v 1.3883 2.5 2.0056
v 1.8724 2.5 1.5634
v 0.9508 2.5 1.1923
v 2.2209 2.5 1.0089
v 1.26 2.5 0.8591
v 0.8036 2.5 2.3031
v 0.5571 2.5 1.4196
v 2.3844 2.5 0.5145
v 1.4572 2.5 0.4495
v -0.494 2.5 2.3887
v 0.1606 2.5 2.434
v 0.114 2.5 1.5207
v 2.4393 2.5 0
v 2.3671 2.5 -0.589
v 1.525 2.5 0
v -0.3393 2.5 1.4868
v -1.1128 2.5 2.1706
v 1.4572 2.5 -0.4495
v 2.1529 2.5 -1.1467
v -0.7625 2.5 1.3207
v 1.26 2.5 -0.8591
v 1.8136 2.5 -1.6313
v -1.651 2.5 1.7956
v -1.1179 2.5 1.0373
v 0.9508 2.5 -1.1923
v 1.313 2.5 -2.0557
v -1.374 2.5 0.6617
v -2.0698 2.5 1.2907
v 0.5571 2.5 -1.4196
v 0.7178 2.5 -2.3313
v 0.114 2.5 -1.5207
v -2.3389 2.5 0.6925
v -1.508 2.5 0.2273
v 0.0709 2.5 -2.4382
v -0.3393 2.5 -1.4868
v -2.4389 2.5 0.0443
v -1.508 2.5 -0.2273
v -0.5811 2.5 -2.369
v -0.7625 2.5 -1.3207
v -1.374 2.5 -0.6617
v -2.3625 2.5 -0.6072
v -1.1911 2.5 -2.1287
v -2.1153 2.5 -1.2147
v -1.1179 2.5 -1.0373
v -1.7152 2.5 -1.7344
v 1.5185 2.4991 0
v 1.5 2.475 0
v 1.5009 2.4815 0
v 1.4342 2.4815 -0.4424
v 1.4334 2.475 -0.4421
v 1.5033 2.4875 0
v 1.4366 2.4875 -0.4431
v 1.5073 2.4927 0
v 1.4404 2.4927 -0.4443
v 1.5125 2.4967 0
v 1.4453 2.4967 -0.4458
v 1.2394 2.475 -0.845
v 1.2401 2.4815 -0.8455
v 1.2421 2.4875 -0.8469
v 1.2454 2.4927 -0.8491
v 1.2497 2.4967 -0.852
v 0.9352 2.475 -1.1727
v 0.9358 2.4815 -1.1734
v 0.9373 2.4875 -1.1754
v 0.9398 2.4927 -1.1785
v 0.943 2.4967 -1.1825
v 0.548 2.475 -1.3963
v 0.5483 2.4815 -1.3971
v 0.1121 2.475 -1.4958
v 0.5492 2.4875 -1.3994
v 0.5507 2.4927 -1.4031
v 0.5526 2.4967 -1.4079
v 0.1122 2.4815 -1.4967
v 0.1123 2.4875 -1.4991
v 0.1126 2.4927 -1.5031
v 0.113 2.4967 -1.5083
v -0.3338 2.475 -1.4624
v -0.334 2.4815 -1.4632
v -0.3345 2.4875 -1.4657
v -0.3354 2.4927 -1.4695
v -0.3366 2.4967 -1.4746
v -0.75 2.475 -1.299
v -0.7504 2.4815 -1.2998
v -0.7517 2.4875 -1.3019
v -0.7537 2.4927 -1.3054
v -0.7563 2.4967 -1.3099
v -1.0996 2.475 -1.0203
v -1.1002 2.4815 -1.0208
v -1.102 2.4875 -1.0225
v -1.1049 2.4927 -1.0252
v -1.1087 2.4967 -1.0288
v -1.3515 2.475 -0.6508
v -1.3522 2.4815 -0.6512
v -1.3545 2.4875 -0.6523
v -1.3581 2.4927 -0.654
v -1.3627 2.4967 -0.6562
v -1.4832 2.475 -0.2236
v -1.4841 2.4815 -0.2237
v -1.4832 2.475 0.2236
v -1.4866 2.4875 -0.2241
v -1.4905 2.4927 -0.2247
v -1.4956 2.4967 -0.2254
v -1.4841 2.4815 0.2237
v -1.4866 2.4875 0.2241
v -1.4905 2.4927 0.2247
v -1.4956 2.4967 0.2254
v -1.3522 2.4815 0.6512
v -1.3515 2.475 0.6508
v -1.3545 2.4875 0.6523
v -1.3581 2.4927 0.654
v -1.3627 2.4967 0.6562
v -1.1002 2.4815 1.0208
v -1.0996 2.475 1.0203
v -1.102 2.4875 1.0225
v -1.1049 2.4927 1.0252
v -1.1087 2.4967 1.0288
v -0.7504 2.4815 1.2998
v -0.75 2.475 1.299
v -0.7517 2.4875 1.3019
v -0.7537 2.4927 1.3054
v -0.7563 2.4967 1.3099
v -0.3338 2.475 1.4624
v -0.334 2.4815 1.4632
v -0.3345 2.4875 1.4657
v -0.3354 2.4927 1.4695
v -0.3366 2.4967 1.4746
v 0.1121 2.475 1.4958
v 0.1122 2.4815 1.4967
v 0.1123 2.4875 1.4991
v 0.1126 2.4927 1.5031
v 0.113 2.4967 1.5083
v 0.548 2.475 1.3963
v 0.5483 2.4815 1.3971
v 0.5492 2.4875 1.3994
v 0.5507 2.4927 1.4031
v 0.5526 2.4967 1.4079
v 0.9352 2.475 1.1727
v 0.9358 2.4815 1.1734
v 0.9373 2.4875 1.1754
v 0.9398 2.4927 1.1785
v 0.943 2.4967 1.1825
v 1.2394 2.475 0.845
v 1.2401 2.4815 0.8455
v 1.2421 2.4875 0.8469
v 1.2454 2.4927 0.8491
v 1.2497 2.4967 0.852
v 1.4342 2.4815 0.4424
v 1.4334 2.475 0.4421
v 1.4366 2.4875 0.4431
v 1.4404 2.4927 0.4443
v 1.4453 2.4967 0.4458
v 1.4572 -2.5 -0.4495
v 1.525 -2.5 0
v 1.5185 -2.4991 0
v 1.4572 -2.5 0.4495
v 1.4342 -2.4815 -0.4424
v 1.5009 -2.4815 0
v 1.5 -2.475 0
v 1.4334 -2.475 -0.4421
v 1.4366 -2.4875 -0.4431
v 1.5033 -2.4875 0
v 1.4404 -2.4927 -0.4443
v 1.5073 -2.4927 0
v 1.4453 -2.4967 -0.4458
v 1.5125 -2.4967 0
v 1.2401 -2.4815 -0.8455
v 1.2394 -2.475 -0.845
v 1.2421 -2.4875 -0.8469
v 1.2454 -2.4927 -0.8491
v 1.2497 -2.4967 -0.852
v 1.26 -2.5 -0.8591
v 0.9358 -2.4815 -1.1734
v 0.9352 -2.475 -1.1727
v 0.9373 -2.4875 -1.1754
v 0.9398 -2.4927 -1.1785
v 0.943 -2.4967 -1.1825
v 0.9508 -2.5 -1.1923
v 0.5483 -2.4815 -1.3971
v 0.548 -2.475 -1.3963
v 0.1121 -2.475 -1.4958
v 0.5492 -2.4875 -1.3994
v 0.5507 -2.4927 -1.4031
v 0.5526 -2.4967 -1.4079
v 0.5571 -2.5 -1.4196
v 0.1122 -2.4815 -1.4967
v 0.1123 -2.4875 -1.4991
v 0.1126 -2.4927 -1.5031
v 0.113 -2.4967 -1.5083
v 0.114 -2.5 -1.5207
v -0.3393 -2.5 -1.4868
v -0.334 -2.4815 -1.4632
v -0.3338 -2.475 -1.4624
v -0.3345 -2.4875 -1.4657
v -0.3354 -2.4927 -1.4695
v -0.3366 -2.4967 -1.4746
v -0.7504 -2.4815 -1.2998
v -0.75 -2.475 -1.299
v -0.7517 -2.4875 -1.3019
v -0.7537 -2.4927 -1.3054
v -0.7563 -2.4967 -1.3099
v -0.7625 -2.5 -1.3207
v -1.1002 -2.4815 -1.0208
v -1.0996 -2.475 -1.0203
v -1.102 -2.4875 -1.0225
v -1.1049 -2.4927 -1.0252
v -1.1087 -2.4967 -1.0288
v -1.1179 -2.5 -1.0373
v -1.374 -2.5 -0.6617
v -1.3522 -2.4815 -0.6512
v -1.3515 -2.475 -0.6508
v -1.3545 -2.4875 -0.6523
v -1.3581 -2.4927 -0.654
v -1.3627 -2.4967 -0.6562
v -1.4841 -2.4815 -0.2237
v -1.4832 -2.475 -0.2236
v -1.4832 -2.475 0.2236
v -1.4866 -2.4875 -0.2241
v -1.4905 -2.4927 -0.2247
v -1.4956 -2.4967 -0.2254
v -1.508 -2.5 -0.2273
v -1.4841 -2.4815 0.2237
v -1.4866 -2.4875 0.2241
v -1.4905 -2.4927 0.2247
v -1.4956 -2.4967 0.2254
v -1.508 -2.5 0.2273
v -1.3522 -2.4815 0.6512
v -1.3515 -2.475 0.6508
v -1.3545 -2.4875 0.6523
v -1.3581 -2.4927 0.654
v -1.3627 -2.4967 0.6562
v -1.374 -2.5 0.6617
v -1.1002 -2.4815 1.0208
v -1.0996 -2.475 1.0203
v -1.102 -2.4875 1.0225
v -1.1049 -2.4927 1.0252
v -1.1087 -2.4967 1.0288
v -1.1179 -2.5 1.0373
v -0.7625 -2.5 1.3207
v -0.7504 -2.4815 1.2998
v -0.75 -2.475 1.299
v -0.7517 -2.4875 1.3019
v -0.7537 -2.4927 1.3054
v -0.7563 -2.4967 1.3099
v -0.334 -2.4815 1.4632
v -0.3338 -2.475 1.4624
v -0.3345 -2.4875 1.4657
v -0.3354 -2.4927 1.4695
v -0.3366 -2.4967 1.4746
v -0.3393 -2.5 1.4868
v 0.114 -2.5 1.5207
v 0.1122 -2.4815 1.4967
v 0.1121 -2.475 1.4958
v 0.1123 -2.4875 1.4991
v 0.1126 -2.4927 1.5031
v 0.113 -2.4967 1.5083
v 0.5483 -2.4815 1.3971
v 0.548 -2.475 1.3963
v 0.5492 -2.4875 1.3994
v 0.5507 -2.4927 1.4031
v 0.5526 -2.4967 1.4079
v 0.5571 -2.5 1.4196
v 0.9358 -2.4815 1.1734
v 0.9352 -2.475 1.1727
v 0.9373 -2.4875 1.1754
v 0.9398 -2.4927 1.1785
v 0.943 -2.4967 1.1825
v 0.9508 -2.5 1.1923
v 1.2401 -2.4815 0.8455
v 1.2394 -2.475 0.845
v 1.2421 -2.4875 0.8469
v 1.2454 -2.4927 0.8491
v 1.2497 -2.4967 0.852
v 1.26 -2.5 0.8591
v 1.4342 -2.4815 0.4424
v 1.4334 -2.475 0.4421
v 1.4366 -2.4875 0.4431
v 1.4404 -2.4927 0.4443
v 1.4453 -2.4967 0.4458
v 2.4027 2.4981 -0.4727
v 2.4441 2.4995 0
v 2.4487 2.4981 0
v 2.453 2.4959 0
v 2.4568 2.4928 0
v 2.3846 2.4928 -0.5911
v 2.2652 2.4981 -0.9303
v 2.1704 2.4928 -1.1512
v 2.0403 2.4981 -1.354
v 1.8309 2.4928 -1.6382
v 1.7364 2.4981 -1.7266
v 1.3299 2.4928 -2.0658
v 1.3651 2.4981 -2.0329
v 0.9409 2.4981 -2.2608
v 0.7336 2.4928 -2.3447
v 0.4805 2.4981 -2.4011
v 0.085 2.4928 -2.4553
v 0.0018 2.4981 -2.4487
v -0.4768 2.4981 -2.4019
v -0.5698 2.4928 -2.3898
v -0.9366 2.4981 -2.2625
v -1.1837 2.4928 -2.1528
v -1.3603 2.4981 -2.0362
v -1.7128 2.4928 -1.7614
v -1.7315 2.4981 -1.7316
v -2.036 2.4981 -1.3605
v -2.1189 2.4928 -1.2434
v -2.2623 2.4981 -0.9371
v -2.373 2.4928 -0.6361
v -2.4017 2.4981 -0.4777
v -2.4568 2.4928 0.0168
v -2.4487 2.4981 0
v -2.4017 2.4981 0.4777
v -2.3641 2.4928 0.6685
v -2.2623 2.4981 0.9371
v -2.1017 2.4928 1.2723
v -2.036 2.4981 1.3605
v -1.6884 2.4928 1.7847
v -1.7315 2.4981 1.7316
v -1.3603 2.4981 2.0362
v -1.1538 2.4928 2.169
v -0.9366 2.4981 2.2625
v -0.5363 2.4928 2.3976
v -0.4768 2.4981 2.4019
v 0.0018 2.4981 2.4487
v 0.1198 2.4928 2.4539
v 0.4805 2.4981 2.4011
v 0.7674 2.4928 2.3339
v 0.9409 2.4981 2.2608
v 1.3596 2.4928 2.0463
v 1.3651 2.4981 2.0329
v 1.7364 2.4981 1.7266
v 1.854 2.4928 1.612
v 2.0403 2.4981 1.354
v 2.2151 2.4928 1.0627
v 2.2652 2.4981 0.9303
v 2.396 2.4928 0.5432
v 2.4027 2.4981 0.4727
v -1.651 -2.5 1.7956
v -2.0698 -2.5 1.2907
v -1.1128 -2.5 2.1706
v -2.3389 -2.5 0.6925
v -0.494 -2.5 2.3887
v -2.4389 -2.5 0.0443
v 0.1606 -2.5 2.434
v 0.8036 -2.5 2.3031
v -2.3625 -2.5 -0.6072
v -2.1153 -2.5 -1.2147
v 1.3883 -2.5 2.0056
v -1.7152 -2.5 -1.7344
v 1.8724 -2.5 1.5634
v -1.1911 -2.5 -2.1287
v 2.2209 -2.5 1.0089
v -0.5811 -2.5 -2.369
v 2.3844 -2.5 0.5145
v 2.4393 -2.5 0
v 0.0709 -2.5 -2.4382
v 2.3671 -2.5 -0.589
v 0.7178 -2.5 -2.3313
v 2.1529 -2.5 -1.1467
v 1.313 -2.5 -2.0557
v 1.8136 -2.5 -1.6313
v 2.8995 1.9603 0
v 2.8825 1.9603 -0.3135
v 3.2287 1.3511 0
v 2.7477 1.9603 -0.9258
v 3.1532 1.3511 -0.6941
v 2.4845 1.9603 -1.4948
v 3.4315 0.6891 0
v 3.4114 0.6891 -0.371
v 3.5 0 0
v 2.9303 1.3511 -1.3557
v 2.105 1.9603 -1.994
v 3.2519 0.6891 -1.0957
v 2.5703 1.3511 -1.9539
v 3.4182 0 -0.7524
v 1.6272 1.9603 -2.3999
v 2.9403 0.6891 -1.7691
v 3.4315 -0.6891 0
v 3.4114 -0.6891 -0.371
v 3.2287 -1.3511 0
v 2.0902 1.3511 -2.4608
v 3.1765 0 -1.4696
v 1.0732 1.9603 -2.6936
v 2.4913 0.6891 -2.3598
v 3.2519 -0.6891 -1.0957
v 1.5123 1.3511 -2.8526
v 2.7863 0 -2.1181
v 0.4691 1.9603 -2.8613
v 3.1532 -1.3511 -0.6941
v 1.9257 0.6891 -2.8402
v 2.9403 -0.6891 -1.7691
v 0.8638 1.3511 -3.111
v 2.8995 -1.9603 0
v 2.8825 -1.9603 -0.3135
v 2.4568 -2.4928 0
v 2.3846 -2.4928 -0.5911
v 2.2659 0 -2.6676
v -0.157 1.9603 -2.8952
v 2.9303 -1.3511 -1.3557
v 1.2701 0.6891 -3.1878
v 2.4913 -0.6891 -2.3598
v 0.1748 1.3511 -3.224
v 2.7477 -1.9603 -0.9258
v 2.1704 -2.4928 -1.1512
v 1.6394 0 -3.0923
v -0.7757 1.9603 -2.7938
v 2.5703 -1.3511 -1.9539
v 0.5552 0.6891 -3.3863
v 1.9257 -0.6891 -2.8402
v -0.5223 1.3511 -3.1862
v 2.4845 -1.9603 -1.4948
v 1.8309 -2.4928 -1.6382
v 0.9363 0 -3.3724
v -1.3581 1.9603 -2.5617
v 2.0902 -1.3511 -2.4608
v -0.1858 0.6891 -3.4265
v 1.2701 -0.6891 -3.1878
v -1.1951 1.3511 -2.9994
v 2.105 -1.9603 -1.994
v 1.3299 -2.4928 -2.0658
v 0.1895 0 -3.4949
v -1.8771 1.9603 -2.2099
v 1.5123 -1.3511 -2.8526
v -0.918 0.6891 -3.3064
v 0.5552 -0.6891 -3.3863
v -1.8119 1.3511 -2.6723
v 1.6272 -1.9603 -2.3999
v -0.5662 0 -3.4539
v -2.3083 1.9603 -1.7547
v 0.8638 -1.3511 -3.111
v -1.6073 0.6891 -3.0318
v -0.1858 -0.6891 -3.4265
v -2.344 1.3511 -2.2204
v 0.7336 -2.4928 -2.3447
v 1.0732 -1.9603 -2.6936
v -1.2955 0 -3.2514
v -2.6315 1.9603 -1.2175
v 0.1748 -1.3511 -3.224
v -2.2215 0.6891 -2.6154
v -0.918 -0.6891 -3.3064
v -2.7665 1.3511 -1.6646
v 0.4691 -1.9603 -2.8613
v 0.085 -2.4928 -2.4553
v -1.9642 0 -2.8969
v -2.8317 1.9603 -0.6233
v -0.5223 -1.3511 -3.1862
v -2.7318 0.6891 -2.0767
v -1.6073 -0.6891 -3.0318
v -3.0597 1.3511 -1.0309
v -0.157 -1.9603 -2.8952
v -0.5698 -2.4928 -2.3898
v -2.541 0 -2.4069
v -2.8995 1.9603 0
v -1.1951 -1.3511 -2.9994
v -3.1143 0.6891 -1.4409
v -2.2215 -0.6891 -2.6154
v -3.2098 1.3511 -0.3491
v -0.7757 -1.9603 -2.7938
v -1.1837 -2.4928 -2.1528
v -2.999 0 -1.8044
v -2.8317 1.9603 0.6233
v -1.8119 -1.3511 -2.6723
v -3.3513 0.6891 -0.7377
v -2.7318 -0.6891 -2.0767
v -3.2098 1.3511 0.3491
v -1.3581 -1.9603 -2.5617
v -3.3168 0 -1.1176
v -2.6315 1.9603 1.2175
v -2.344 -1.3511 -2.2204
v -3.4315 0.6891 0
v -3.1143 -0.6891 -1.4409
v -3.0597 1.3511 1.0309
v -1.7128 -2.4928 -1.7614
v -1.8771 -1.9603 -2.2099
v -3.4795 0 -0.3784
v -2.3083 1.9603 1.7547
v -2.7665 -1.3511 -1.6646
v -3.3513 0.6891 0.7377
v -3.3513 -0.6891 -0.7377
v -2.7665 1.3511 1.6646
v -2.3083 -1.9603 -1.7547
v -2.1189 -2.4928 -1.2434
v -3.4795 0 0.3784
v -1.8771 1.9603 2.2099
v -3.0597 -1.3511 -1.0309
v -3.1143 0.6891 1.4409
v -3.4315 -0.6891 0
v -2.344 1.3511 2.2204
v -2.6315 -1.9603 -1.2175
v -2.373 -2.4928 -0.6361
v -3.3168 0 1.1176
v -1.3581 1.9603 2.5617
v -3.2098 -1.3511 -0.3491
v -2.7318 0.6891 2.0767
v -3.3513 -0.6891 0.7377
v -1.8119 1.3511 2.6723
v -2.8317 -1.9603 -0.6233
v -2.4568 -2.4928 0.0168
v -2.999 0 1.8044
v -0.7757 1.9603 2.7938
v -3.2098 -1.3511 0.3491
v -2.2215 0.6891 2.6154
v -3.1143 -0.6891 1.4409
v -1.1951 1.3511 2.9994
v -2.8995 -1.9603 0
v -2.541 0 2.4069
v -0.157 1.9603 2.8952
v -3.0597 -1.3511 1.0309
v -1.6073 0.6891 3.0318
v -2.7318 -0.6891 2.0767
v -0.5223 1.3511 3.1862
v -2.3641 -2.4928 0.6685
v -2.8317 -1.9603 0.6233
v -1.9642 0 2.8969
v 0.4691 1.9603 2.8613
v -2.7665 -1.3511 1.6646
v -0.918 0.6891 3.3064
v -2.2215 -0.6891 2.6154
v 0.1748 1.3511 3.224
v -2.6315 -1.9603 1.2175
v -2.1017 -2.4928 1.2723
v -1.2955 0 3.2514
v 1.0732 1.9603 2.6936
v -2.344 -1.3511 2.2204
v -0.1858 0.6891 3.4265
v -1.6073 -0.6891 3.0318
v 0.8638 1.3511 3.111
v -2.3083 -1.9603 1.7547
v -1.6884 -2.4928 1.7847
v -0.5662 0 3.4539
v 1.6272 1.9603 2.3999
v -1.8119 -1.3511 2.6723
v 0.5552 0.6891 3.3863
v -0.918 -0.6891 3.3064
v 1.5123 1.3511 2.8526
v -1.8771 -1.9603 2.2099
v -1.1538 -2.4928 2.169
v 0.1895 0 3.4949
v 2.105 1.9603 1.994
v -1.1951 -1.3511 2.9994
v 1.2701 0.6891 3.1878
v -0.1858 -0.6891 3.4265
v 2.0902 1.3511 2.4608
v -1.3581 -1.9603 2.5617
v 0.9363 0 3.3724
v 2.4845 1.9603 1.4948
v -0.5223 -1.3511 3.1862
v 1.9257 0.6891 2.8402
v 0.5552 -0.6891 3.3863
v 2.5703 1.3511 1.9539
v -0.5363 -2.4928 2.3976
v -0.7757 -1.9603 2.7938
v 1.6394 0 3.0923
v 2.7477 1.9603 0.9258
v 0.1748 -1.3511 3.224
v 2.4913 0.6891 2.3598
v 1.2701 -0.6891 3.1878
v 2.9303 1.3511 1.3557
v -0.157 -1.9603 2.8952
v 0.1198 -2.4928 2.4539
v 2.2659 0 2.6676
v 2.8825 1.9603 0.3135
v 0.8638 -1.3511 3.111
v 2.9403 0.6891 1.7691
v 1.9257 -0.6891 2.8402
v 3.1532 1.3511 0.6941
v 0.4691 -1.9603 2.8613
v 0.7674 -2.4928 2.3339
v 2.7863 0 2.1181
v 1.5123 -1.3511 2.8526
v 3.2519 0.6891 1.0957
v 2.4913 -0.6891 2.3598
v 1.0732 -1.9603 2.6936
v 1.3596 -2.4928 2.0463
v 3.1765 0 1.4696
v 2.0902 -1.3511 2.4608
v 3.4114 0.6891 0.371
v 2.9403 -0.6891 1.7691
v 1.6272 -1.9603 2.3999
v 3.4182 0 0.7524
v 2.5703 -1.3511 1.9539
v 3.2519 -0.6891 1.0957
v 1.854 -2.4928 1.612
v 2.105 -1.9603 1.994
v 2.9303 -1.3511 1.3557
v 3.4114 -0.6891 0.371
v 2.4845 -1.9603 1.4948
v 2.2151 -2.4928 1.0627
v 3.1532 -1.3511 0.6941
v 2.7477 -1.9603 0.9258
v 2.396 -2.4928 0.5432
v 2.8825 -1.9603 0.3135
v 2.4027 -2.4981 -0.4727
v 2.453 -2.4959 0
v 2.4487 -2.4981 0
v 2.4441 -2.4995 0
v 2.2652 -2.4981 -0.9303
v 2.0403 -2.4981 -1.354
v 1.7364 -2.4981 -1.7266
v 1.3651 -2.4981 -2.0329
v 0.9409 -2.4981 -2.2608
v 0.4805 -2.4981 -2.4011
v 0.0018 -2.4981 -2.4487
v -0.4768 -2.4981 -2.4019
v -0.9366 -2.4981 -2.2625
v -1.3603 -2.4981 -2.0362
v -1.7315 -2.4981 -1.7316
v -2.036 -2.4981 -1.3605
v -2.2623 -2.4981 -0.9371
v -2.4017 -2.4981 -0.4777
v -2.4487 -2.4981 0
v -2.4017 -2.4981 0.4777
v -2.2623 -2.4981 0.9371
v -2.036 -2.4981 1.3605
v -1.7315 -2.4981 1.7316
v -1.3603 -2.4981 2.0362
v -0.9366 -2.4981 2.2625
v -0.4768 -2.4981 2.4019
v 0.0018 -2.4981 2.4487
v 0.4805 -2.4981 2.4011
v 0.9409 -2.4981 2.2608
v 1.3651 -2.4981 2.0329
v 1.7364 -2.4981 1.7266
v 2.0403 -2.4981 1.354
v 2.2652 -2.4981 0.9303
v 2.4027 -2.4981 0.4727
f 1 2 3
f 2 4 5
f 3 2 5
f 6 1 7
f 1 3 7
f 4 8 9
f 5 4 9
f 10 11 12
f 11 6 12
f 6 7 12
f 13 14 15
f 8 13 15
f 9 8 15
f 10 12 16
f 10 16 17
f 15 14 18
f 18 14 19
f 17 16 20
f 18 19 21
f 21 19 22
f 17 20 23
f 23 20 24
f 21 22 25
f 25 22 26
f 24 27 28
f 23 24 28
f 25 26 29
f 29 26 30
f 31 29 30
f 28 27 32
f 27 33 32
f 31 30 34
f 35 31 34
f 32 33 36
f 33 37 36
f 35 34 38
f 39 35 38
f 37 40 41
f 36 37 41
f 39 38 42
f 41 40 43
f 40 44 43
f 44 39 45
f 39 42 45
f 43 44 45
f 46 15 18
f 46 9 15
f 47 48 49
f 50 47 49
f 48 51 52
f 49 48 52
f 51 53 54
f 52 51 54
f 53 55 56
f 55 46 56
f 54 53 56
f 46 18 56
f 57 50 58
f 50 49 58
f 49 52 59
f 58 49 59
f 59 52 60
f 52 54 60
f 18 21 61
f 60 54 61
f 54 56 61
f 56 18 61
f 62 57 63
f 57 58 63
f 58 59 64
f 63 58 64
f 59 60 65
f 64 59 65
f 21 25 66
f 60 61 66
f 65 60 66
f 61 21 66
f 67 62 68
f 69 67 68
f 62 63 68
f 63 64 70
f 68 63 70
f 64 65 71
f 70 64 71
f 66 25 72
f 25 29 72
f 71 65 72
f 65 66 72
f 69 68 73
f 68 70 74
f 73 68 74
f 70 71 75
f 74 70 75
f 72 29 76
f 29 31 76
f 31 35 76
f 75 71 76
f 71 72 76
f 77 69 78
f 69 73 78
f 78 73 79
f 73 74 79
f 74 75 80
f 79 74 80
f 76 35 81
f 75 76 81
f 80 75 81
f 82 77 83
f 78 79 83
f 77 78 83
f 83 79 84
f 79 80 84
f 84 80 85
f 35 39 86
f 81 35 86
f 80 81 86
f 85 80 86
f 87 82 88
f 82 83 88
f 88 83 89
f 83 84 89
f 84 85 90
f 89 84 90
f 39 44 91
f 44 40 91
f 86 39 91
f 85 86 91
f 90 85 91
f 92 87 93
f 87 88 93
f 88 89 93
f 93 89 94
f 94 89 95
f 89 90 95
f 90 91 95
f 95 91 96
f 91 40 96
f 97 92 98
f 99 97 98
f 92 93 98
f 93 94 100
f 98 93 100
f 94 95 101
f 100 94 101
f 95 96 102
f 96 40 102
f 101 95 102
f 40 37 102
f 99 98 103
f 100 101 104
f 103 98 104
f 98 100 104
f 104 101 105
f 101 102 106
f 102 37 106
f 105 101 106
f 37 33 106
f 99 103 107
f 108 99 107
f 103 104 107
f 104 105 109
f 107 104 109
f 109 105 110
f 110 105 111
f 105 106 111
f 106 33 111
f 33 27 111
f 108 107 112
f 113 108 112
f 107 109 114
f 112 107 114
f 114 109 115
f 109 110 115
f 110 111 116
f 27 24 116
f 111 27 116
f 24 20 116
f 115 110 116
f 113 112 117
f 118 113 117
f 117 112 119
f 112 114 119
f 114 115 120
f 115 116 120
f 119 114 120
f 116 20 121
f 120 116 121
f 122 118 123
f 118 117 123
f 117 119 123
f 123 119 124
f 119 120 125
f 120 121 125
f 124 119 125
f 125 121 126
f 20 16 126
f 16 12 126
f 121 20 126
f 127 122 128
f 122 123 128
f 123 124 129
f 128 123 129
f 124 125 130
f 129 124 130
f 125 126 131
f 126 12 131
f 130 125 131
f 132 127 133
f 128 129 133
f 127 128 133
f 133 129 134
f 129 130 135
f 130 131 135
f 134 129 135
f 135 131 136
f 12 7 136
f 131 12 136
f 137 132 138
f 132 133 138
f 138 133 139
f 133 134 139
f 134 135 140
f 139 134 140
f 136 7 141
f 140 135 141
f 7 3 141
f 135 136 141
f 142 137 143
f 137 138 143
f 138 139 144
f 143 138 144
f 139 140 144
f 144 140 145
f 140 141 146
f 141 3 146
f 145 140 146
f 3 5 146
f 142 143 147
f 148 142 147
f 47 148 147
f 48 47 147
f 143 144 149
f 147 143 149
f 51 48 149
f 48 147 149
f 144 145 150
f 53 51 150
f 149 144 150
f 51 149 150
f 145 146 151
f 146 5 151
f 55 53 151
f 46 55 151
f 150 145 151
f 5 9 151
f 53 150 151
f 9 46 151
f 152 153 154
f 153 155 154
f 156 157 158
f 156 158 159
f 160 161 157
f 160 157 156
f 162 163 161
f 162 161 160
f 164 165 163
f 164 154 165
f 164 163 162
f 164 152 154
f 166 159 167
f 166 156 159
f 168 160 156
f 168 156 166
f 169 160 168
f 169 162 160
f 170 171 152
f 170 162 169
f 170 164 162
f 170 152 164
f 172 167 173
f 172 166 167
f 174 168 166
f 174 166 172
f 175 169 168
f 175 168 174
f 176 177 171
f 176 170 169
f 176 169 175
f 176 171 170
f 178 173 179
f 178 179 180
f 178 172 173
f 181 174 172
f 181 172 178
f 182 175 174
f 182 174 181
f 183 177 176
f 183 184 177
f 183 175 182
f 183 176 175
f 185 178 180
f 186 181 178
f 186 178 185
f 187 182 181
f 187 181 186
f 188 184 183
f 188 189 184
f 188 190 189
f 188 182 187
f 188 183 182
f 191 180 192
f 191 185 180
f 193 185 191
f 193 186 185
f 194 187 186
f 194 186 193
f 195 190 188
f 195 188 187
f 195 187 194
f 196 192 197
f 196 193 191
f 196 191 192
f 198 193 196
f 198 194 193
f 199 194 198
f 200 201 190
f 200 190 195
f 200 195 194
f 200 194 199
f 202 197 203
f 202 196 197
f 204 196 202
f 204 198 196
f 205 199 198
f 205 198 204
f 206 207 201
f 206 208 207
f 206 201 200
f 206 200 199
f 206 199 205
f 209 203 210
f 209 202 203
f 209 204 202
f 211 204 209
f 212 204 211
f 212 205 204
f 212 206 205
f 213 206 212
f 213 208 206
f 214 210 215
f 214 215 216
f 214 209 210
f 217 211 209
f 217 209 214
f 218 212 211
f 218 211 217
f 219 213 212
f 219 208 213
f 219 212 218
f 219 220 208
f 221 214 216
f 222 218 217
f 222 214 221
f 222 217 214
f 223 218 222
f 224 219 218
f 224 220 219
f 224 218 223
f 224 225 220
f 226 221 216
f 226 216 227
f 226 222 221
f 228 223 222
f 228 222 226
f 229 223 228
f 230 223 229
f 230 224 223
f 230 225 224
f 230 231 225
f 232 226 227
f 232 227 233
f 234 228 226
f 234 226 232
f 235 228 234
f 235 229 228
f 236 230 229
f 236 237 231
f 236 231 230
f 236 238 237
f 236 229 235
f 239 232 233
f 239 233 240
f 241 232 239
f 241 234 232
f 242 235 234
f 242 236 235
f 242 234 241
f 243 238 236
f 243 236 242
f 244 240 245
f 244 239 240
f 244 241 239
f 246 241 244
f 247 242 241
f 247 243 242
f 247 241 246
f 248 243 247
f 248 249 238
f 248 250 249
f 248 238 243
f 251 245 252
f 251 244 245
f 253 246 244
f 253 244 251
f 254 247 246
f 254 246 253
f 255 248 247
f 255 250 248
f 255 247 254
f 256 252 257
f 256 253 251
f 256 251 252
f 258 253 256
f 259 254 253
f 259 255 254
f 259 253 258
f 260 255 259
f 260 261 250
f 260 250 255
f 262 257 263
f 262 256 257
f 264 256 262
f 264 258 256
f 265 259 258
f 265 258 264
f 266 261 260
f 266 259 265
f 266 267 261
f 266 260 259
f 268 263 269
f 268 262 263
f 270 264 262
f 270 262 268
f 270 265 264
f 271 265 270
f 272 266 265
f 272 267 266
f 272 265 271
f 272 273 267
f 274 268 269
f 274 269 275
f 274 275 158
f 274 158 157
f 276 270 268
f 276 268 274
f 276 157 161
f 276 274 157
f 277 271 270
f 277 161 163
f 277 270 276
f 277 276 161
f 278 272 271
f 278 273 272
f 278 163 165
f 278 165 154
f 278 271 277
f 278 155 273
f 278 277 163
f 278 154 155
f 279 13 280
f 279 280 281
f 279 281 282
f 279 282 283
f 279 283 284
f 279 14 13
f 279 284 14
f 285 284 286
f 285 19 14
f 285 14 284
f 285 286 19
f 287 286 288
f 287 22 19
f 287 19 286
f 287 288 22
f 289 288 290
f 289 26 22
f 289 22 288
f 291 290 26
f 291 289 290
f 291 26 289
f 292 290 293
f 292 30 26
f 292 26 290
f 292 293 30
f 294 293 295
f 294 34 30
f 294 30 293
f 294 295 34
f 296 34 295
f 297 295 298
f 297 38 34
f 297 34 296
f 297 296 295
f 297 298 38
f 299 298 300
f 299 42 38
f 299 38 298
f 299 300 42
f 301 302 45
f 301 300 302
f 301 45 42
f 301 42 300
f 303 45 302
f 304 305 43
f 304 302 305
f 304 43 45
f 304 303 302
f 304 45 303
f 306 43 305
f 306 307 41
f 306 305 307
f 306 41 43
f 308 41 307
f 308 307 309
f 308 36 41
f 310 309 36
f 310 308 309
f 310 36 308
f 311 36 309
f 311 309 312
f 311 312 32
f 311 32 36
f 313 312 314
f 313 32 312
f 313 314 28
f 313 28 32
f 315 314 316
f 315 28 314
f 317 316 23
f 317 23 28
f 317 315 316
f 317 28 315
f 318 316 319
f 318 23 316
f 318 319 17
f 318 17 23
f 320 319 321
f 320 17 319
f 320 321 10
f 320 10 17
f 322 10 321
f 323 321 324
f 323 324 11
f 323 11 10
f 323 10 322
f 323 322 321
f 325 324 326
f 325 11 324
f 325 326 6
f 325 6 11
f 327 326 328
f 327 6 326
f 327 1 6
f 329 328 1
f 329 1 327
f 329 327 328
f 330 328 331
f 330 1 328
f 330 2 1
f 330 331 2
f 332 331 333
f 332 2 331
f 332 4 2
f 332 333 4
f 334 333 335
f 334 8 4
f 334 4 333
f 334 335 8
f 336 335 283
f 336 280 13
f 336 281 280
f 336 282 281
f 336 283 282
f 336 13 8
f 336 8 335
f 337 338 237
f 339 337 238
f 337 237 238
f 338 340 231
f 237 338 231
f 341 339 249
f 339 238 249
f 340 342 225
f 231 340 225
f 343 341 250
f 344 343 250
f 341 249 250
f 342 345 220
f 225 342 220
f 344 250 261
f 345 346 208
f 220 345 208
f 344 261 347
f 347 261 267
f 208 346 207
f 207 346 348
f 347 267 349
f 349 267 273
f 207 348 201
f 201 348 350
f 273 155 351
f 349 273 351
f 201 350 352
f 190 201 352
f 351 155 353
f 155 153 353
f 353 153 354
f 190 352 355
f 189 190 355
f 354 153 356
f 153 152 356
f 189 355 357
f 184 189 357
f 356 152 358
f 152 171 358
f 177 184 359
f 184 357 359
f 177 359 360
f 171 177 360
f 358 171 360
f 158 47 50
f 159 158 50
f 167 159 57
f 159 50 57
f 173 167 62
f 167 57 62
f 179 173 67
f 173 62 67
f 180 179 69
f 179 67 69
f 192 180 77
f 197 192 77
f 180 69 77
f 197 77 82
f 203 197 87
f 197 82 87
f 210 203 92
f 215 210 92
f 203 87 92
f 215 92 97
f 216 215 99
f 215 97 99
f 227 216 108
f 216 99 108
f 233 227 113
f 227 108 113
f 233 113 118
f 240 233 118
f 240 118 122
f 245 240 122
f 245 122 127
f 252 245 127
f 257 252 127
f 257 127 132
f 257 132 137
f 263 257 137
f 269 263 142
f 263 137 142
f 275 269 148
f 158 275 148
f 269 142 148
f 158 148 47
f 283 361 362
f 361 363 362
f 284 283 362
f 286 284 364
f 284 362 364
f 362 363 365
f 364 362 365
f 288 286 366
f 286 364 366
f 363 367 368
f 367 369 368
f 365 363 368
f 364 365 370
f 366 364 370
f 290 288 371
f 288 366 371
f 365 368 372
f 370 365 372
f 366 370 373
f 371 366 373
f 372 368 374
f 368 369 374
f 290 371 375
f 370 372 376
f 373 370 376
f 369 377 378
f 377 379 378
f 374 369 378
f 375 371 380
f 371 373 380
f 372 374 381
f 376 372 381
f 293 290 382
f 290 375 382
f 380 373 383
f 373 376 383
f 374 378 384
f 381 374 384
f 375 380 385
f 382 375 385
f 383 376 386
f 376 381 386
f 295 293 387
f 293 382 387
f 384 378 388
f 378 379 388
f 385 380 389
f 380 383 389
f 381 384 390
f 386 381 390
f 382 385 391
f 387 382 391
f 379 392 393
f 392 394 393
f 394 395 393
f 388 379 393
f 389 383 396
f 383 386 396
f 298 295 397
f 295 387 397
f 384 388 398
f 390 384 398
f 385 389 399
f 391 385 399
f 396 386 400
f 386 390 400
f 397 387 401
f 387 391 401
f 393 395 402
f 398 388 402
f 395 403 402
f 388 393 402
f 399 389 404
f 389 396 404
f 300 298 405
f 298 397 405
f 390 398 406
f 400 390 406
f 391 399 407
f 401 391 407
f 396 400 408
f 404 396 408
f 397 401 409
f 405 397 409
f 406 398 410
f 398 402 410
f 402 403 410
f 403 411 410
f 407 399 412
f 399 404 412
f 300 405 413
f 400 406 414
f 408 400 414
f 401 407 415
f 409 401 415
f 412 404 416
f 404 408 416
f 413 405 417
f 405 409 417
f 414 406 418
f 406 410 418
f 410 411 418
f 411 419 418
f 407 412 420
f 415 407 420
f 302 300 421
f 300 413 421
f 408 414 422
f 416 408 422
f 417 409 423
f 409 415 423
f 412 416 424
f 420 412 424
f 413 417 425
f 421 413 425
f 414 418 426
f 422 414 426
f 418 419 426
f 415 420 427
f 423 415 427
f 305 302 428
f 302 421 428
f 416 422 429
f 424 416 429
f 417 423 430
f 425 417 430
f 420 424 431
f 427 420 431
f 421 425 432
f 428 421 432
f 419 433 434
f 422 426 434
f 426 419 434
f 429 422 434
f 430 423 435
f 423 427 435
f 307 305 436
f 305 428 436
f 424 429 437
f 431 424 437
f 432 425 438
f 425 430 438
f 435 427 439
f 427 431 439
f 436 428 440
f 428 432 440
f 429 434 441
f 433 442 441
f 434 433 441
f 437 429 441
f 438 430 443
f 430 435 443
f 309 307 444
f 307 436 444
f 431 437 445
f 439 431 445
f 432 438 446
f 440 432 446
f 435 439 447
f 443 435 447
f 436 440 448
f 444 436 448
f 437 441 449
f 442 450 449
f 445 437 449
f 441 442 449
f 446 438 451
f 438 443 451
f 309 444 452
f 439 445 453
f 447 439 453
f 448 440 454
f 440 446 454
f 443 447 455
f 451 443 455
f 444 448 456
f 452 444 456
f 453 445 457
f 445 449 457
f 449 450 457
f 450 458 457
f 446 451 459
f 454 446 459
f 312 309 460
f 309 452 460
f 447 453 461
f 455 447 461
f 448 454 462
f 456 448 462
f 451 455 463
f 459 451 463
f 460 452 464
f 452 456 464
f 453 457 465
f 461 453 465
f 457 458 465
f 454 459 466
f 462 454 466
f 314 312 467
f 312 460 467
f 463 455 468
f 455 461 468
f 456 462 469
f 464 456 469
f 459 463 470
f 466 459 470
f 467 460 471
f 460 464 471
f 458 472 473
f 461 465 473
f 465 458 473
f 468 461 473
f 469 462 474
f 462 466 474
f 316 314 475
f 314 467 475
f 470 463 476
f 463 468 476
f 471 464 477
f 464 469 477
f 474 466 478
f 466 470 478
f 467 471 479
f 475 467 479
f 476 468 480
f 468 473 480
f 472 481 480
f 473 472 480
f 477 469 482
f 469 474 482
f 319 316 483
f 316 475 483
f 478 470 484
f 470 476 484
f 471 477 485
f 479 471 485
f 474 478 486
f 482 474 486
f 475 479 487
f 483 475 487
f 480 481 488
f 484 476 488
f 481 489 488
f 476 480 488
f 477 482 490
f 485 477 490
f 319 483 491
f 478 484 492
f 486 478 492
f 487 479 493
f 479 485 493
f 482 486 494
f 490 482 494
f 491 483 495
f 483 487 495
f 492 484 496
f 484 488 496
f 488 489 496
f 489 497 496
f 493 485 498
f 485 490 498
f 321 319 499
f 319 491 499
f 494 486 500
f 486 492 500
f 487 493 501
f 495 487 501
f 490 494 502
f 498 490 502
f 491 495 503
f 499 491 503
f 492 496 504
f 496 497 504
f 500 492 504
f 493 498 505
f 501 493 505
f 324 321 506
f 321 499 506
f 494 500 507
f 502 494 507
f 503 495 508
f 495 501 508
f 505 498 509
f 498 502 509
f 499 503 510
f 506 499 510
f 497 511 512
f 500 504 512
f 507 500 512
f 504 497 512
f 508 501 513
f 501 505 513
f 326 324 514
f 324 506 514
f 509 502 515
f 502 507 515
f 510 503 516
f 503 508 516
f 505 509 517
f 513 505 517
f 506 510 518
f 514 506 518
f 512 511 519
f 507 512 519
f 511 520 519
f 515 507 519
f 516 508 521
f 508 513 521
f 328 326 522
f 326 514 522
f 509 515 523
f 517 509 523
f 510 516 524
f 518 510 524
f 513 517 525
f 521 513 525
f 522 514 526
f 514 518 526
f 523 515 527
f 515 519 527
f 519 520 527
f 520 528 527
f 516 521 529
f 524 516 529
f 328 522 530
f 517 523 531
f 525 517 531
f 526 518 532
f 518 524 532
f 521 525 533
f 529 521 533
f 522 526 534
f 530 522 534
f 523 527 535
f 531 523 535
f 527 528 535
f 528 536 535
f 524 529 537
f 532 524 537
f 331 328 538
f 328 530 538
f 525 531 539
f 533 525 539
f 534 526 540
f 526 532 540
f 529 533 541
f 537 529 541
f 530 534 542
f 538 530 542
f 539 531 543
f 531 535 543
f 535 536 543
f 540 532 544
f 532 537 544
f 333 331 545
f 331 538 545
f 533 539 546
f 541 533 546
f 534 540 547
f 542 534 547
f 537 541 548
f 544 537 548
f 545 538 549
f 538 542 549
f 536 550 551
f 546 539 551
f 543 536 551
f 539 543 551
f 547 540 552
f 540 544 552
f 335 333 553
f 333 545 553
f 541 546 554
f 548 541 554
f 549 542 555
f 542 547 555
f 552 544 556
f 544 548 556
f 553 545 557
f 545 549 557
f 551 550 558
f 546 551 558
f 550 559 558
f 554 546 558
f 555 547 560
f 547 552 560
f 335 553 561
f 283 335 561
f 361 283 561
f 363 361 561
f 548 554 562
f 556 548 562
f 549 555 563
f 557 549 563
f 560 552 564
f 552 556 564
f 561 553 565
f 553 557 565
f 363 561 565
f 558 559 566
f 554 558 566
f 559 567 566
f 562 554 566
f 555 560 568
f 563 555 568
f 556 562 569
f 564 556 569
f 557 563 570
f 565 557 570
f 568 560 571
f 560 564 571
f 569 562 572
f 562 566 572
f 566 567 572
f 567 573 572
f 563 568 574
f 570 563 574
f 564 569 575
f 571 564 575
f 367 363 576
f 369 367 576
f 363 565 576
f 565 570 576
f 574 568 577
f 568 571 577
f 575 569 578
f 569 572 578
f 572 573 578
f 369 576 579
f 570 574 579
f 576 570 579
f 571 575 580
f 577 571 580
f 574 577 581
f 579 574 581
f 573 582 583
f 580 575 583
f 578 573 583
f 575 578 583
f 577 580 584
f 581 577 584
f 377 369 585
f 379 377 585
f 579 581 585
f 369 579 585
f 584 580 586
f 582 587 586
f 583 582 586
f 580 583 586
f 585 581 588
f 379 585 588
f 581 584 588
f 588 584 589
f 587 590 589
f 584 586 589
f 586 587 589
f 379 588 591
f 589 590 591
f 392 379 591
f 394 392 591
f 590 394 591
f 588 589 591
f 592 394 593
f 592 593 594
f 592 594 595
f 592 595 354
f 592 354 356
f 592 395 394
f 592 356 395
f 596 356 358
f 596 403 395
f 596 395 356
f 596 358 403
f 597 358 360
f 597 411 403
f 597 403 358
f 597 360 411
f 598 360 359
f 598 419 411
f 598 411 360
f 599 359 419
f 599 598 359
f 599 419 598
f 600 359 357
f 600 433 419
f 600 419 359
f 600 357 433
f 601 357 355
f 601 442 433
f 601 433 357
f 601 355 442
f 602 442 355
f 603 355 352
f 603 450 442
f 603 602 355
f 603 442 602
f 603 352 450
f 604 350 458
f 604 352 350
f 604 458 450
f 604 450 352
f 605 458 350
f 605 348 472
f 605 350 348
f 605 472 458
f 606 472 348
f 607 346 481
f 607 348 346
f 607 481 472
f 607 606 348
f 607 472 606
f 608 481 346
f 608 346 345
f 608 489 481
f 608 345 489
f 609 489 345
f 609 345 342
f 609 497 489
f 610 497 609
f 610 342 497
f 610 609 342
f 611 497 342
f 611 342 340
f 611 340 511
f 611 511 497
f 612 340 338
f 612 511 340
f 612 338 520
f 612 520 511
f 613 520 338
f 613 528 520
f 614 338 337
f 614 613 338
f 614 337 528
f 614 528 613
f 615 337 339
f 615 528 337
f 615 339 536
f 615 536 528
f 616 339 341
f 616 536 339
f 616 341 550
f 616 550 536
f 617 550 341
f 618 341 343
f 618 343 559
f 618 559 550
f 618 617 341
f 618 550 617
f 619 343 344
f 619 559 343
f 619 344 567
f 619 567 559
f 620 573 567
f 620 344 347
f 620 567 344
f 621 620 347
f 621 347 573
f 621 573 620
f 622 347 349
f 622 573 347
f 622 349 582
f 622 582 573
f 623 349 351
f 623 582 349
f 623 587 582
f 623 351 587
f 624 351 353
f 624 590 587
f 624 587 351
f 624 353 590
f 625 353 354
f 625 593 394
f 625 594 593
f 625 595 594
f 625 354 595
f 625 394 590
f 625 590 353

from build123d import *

# Parameters (mm, degrees)
FILLET1_R    = 0.1
SCALE1_SCALE = 0.25


with BuildPart() as part:
    # Sketch1 → Revolve1 (revolve)
    with BuildSketch(Plane.XY):
        with BuildLine():
            Line((6, -10), (6, 10))
            Line((6, 10), (9.797958971, 10))
            ThreePointArc((9.797958971, 10), (14, 0), (9.797958971, -10))
            Line((9.797958971, -10), (6, -10))
        make_face()
    revolve(axis=Axis((0, 0, 0), (0, 1, 0)))

    # Fillet1
    fillet1_edges = [part.edges().sort_by_distance(p)[0] for p in [
        (-9.797958971, -10, 0),
        (-9.797958971, 10, 0),
        (-6, 10, 0),
        (-6, -10, 0),
    ]]
    fillet(fillet1_edges, radius=FILLET1_R)


with BuildPart() as part_1:
    # Scale1: scaled about (-6e-09, 1.26e-07, 0)
    add(part.part.scale(SCALE1_SCALE).moved(Location((-4e-09, 9.4e-08, 0))))


solid = part_1.part
